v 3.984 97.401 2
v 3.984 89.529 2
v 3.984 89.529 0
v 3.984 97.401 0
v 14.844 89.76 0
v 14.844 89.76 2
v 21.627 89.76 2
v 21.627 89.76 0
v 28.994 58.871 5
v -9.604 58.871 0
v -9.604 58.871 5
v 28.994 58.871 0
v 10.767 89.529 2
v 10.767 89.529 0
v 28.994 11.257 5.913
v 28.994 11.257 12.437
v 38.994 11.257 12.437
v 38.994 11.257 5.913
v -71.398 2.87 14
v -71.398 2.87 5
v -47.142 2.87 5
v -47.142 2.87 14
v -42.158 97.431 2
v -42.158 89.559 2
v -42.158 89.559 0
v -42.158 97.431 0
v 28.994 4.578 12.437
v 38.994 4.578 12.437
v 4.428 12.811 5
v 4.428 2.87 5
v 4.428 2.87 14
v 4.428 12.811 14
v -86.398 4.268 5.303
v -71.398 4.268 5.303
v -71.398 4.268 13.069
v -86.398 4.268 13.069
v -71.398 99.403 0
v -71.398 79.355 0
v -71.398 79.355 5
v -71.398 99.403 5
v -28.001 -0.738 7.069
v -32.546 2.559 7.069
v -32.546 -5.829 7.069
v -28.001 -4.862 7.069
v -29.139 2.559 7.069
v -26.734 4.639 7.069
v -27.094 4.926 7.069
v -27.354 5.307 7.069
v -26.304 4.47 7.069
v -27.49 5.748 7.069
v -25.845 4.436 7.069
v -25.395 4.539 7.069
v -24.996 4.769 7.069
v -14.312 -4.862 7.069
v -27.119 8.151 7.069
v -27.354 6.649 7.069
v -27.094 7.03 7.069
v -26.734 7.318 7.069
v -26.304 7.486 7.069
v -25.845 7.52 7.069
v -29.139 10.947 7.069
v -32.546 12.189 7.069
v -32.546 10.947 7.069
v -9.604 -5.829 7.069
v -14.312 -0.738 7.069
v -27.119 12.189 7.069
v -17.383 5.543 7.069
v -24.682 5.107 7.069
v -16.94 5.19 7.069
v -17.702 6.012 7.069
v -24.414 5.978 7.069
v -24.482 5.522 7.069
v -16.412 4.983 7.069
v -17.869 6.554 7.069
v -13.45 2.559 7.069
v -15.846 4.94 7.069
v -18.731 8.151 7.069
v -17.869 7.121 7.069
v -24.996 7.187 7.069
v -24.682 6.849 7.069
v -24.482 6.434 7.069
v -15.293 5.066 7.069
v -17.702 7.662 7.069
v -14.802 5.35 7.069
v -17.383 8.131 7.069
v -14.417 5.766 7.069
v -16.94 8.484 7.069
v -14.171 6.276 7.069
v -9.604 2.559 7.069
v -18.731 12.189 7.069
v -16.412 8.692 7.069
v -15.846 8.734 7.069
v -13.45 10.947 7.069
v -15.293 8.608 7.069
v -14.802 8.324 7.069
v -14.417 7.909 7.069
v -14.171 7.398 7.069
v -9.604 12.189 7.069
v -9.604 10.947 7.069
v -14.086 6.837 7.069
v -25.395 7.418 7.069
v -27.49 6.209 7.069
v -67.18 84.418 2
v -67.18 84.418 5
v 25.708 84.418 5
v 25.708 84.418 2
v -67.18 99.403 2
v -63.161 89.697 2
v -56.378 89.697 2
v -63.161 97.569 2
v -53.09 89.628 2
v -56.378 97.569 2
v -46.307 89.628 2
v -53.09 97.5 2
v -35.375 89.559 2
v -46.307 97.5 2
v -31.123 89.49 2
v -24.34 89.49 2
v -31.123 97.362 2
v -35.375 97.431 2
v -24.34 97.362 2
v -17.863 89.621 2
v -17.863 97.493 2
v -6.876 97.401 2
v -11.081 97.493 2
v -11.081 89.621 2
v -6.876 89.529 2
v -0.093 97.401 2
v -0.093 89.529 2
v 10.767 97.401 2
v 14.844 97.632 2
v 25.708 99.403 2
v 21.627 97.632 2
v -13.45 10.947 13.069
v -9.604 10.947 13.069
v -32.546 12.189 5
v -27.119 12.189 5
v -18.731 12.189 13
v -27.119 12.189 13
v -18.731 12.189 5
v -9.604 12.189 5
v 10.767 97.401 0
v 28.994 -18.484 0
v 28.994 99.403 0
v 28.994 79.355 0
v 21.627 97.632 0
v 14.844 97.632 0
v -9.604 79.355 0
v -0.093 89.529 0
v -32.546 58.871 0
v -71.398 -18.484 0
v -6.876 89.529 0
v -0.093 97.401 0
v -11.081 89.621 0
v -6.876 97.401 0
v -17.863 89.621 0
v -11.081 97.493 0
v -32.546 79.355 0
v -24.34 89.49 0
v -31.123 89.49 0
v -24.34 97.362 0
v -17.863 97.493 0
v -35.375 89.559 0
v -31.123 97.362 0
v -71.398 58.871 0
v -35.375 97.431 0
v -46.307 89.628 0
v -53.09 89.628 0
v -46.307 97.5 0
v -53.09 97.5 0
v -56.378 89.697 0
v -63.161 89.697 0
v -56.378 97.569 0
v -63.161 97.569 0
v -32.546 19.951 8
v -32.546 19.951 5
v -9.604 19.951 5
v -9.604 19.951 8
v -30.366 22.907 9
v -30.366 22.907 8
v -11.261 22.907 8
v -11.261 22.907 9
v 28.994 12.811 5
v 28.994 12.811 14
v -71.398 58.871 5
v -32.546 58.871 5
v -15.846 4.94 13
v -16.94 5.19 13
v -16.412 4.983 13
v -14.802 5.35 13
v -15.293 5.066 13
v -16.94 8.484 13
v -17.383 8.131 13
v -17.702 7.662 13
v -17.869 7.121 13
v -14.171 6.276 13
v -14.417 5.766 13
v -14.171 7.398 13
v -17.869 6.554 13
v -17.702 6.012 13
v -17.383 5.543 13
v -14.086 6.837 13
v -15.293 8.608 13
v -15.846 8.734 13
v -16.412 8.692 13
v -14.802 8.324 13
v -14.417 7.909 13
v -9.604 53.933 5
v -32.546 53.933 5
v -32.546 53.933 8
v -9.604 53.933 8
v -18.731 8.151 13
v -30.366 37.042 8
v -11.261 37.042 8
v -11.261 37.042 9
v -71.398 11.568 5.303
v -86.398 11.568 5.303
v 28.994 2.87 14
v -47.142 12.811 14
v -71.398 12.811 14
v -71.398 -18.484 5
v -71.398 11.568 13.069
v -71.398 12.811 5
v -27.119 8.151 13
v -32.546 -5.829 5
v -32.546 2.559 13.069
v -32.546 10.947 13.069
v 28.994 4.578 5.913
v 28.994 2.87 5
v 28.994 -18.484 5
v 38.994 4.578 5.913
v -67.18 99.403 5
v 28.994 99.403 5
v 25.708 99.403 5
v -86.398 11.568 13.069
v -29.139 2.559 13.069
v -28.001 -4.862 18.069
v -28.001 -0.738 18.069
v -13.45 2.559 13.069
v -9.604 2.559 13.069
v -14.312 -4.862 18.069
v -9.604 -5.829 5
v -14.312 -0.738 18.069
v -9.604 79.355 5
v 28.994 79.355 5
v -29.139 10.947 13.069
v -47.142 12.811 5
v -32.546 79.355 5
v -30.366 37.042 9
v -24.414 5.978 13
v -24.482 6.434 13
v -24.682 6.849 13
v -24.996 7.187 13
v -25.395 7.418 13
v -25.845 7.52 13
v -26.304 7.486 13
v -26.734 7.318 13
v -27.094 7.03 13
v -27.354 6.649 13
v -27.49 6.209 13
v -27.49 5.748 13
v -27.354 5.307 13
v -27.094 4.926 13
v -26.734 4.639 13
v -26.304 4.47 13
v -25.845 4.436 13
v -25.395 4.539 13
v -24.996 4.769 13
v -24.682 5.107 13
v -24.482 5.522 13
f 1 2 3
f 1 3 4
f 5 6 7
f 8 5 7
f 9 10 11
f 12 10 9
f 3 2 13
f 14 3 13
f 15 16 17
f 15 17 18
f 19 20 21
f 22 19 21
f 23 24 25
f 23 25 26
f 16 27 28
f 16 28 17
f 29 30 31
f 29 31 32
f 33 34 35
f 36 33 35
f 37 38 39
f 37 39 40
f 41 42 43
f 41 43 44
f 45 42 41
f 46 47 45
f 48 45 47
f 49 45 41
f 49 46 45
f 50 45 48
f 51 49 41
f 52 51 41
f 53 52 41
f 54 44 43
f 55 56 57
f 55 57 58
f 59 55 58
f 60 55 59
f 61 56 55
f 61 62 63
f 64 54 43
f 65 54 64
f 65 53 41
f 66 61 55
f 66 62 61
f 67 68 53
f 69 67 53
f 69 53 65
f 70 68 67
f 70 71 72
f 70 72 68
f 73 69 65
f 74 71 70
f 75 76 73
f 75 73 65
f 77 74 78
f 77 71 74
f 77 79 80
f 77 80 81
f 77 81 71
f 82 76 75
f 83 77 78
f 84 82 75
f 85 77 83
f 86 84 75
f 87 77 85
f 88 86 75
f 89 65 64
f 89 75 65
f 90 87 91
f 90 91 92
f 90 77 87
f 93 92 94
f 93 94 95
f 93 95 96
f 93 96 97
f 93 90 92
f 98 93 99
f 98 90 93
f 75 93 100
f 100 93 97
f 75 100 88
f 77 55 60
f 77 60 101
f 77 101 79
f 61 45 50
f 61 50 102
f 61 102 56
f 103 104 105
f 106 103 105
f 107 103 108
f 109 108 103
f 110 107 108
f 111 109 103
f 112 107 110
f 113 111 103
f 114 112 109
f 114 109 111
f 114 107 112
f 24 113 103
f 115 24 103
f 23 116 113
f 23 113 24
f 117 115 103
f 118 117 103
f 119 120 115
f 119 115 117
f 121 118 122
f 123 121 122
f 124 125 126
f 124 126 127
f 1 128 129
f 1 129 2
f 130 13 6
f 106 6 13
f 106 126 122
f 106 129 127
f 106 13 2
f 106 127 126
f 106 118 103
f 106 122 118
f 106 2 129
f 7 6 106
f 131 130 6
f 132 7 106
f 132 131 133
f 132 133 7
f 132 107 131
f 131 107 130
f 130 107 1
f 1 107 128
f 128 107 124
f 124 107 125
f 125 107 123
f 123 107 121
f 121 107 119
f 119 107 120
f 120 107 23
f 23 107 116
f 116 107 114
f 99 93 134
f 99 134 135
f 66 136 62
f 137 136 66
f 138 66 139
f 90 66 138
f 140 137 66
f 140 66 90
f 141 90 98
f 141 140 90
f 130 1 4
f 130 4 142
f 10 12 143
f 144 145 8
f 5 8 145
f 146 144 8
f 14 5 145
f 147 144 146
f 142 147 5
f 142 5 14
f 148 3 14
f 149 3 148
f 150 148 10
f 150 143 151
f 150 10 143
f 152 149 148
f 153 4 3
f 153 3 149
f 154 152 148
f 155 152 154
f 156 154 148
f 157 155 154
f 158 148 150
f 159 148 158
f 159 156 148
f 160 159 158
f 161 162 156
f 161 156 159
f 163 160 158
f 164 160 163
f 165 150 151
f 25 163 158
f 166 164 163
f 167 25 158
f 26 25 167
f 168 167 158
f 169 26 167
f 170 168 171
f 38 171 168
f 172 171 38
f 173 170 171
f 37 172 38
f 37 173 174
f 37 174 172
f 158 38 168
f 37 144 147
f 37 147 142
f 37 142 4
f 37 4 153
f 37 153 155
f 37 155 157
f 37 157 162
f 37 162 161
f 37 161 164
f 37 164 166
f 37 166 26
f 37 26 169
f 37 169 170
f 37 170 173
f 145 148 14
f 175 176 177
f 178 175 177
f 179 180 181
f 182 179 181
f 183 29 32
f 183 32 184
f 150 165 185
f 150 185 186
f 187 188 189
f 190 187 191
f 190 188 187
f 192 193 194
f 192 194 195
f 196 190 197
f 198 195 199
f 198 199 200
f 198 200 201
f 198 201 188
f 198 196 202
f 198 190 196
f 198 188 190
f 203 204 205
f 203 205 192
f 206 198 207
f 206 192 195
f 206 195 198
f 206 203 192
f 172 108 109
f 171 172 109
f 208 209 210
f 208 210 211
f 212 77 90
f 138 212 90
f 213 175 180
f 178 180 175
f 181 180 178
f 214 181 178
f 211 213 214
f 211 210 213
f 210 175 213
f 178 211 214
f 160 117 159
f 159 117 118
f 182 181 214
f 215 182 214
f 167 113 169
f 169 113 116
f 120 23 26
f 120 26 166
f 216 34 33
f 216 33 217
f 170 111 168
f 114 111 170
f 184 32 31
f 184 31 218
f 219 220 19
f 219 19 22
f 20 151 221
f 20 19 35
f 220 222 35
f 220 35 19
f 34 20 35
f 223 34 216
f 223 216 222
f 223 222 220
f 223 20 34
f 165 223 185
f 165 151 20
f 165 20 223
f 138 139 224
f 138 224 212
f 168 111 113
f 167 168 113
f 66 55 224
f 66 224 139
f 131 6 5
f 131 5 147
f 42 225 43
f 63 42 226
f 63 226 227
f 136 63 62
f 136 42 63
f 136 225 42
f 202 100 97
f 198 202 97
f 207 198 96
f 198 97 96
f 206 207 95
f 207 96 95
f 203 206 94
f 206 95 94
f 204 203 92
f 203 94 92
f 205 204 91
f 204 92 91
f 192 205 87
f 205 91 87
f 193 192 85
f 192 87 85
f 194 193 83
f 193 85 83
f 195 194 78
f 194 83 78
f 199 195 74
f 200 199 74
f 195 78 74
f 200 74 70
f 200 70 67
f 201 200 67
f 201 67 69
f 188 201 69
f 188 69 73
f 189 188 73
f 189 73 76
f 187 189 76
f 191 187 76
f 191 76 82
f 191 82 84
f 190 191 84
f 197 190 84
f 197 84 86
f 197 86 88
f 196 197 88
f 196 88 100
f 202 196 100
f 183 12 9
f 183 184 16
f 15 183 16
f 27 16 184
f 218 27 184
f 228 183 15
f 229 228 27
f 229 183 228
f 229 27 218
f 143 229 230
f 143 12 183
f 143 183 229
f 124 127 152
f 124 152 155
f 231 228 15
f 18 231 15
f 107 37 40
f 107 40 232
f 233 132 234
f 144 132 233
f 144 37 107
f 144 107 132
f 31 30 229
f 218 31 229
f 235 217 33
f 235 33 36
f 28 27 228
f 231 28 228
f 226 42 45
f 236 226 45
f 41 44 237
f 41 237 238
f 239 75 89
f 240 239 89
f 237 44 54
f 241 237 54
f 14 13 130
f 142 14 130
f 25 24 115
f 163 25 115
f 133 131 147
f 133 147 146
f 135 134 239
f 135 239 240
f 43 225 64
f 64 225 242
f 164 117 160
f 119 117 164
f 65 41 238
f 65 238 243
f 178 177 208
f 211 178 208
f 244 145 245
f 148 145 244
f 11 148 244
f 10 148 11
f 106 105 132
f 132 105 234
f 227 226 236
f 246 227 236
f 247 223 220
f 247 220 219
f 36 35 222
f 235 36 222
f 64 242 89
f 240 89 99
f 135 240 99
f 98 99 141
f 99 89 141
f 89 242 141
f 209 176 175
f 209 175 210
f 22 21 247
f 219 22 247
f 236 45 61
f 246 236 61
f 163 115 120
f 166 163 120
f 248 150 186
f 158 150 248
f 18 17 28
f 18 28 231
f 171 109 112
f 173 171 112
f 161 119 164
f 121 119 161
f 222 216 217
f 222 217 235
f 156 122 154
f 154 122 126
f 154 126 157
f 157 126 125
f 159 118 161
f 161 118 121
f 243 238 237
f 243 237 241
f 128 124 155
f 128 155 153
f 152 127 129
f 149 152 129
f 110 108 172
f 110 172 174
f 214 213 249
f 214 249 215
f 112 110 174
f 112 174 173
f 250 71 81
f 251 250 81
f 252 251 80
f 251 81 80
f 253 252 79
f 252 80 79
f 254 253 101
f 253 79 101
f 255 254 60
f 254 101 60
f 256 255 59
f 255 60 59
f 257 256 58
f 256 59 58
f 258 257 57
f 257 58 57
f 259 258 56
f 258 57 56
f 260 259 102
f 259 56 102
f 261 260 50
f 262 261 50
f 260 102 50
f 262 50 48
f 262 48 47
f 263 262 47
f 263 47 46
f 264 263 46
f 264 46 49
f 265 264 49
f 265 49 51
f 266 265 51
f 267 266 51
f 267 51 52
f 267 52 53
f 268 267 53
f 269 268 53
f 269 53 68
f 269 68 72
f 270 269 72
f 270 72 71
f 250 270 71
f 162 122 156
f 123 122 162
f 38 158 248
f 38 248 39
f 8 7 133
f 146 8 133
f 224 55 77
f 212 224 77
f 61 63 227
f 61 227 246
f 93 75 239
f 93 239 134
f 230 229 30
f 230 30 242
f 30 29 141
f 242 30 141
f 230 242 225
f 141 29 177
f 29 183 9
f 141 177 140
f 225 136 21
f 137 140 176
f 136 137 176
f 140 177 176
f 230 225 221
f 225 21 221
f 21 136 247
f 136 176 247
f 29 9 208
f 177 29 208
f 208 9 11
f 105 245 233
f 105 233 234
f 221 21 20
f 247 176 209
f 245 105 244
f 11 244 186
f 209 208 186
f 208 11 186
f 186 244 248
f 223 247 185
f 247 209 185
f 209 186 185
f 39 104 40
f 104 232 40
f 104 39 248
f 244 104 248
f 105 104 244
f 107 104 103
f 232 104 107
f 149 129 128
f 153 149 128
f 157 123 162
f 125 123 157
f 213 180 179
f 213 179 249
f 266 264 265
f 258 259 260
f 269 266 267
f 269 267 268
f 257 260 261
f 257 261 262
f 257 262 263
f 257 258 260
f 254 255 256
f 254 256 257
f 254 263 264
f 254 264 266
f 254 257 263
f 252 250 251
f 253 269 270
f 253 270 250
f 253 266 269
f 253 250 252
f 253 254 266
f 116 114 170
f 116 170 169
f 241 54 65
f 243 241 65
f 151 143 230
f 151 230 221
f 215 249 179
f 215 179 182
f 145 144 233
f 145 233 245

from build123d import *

# Parameters (mm, degrees)
RESSALTO_EXTRUS_O1_DEPTH      = 5
ESBO_O4_W                     = 92.887769858
ESBO_O4_H                     = 14.984754445
CORTE_EXTRUS_O1_DEPTH         = 3
RESSALTO_EXTRUS_O12_OUTLINE_W = 22.942167962
RESSALTO_EXTRUS_O12_OUTLINE_H = 18.018363384
RESSALTO_EXTRUS_O12_DEPTH     = 2.068801543
ESBO_O10_W                    = 24.255846062
ESBO_O10_H                    = 9.941166005
RESSALTO_EXTRUS_O2_DEPTH      = 9
ESBO_O12_W                    = 24.5665075
ESBO_O12_H                    = 9.941166005
RESSALTO_EXTRUS_O3_DEPTH      = 9
ESBO_O13_W                    = 22.942167962
ESBO_O13_H                    = 33.982493236
RESSALTO_EXTRUS_O4_DEPTH      = 3
ESBO_O14_W                    = 6.782835172
ESBO_O14_H                    = 7.872436605
ESBO_O14_W_2                  = 6.782835171
ESBO_O14_H_2                  = 7.872436606
CORTE_EXTRUS_O4_DEPTH         = 3
ESBO_O15_W                    = 19.105678415
ESBO_O15_H                    = 14.135095414
RESSALTO_EXTRUS_O5_DEPTH      = 1
ESBO_O18_W                    = 6.523890191
ESBO_O18_H                    = 6.679220909
RESSALTO_EXTRUS_O9_DEPTH      = 10
ESBO_O19_W                    = 7.766535942
ESBO_O19_H                    = 7.300543785
RESSALTO_EXTRUS_O10_DEPTH     = 15
ESBO_O21_W                    = 13.689709829
ESBO_O21_H                    = 4.124463858
RESSALTO_EXTRUS_O13_DEPTH     = 11
ESBO_O22_W                    = 3.40794345
ESBO_O22_H                    = 8.387858817
ESBO_O22_W_2                  = 3.845821911
RESSALTO_EXTRUS_O14_DEPTH     = 6
ESBO_O23_R                    = 1.902232627
ESBO_O23_R_2                  = 1.546559196
ESBO_O23_W                    = 8.387858817
ESBO_O23_H                    = 4.038598689
RESSALTO_EXTRUS_O15_DEPTH     = 8


# Read off the part's stored shape, not the designer's step: Ressalto-extrusão12
with BuildPart() as part:
    # Esboço2 → Ressalto-extrusão1 (new body)
    with BuildSketch(Plane.XY):
        Polygon((-71.39802883, 58.87134079), (-32.546471332, 58.87134079), (-32.546471332, 79.355053275), (-71.39802883, 79.355053275), (-71.39802883, 99.40294209), (28.994123383, 99.40294209), (28.994123383, 79.355053275), (-9.60430337, 79.355053275), (-9.60430337, 58.87134079), (28.994123383, 58.87134079), (28.994123383, -18.483753656), (-71.39802883, -18.483753656), align=None)
    extrude(amount=RESSALTO_EXTRUS_O1_DEPTH)

    # Esboço4 → Corte-extrusão1 (cut)
    with BuildSketch(Plane.XY.offset(5)):
        with Locations((-20.735960567, 91.910564867)):
            Rectangle(ESBO_O4_W, ESBO_O4_H)
    extrude(amount=-CORTE_EXTRUS_O1_DEPTH, mode=Mode.SUBTRACT)

    # Ressalto-extrusão12 outline → Ressalto-extrusão12 (add)
    with BuildSketch(Plane.XY.offset(5)):
        with Locations((-21.075387351, 3.180221698)):
            Rectangle(RESSALTO_EXTRUS_O12_OUTLINE_W, RESSALTO_EXTRUS_O12_OUTLINE_H)
    extrude(amount=RESSALTO_EXTRUS_O12_DEPTH)

    # Esboço10 → Ressalto-extrusão2 (add)
    with BuildSketch(Plane.XY.offset(5)):
        with Locations((-59.270105799, 7.840143264)):
            Rectangle(ESBO_O10_W, ESBO_O10_H)
    extrude(amount=RESSALTO_EXTRUS_O2_DEPTH)

    # Esboço12 → Ressalto-extrusão3 (add)
    with BuildSketch(Plane.XY.offset(5)):
        with Locations((16.710869633, 7.840143264)):
            Rectangle(ESBO_O12_W, ESBO_O12_H)
    extrude(amount=RESSALTO_EXTRUS_O3_DEPTH)

    # Esboço13 → Ressalto-extrusão4 (add)
    with BuildSketch(Plane.XY.offset(5)):
        with Locations((-21.075387351, 36.942158983)):
            Rectangle(ESBO_O13_W, ESBO_O13_H)
    extrude(amount=RESSALTO_EXTRUS_O4_DEPTH)

    # Esboço14 → Corte-extrusão4 (cut)
    with BuildSketch(Plane.XY.offset(2)):
        with Locations((-49.698600708, 93.563993113)):
            Rectangle(ESBO_O14_W, ESBO_O14_H)
        with Locations((-14.471948292, 93.556871263)):
            Rectangle(ESBO_O14_W, ESBO_O14_H)
        with Locations((-38.766760461, 93.495131296)):
            Rectangle(ESBO_O14_W_2, ESBO_O14_H_2)
        with Locations((-27.731681244, 93.42626948)):
            Rectangle(ESBO_O14_W, ESBO_O14_H)
        with Locations((-59.769614495, 93.632854929)):
            Rectangle(ESBO_O14_W_2, ESBO_O14_H_2)
        with Locations((-3.484568548, 93.465026179)):
            Rectangle(ESBO_O14_W, ESBO_O14_H_2)
        with Locations((7.375442348, 93.465026179)):
            Rectangle(ESBO_O14_W, ESBO_O14_H_2)
        with Locations((18.235453244, 93.696013601)):
            Rectangle(ESBO_O14_W, ESBO_O14_H_2)
    extrude(amount=-CORTE_EXTRUS_O4_DEPTH, mode=Mode.SUBTRACT)

    # Esboço15 → Ressalto-extrusão5 (add)
    with BuildSketch(Plane.XY.offset(8)):
        with Locations((-20.813625927, 29.974770696)):
            Rectangle(ESBO_O15_W, ESBO_O15_H)
    extrude(amount=RESSALTO_EXTRUS_O5_DEPTH)

    # Esboço18 → Ressalto-extrusão9 (add)
    with BuildSketch(Plane(origin=(28.994123383, 0, 0), x_dir=(0, 0, -1), z_dir=(1, 0, 0))):
        with Locations((-9.174630064, 7.917808623)):
            Rectangle(ESBO_O18_W, ESBO_O18_H)
    extrude(amount=RESSALTO_EXTRUS_O9_DEPTH)

    # Esboço19 → Ressalto-extrusão10 (add)
    with BuildSketch(Plane.ZY.offset(71.39802883)):
        with Locations((9.185815902, 7.917808623)):
            Rectangle(ESBO_O19_W, ESBO_O19_H)
    extrude(amount=RESSALTO_EXTRUS_O10_DEPTH)

    # Esboço21 → Ressalto-extrusão13 (add)
    with BuildSketch(Plane.XY.offset(7.068801543)):
        with Locations((-21.156578629, -2.799751995)):
            Rectangle(ESBO_O21_W, ESBO_O21_H)
    extrude(amount=RESSALTO_EXTRUS_O13_DEPTH)

    # Esboço22 → Ressalto-extrusão14 (add)
    with BuildSketch(Plane.XY.offset(7.068801543)):
        with Locations((-30.842499607, 6.752828232)):
            Rectangle(ESBO_O22_W, ESBO_O22_H)
        with Locations((-11.527214326, 6.752828232)):
            Rectangle(ESBO_O22_W_2, ESBO_O22_H)
    extrude(amount=RESSALTO_EXTRUS_O14_DEPTH)

    # Esboço23 → Ressalto-extrusão15 (add)
    with BuildSketch(Plane.XY.offset(5)):
        with Locations((-15.988396591, 6.837106018)):
            Circle(ESBO_O23_R)
        with Locations((-25.960235387, 5.97818713)):
            Circle(ESBO_O23_R_2)
        with Locations((-22.92529913, 10.170104046)):
            Rectangle(ESBO_O23_W, ESBO_O23_H)
    extrude(amount=RESSALTO_EXTRUS_O15_DEPTH)


solid = part.part
